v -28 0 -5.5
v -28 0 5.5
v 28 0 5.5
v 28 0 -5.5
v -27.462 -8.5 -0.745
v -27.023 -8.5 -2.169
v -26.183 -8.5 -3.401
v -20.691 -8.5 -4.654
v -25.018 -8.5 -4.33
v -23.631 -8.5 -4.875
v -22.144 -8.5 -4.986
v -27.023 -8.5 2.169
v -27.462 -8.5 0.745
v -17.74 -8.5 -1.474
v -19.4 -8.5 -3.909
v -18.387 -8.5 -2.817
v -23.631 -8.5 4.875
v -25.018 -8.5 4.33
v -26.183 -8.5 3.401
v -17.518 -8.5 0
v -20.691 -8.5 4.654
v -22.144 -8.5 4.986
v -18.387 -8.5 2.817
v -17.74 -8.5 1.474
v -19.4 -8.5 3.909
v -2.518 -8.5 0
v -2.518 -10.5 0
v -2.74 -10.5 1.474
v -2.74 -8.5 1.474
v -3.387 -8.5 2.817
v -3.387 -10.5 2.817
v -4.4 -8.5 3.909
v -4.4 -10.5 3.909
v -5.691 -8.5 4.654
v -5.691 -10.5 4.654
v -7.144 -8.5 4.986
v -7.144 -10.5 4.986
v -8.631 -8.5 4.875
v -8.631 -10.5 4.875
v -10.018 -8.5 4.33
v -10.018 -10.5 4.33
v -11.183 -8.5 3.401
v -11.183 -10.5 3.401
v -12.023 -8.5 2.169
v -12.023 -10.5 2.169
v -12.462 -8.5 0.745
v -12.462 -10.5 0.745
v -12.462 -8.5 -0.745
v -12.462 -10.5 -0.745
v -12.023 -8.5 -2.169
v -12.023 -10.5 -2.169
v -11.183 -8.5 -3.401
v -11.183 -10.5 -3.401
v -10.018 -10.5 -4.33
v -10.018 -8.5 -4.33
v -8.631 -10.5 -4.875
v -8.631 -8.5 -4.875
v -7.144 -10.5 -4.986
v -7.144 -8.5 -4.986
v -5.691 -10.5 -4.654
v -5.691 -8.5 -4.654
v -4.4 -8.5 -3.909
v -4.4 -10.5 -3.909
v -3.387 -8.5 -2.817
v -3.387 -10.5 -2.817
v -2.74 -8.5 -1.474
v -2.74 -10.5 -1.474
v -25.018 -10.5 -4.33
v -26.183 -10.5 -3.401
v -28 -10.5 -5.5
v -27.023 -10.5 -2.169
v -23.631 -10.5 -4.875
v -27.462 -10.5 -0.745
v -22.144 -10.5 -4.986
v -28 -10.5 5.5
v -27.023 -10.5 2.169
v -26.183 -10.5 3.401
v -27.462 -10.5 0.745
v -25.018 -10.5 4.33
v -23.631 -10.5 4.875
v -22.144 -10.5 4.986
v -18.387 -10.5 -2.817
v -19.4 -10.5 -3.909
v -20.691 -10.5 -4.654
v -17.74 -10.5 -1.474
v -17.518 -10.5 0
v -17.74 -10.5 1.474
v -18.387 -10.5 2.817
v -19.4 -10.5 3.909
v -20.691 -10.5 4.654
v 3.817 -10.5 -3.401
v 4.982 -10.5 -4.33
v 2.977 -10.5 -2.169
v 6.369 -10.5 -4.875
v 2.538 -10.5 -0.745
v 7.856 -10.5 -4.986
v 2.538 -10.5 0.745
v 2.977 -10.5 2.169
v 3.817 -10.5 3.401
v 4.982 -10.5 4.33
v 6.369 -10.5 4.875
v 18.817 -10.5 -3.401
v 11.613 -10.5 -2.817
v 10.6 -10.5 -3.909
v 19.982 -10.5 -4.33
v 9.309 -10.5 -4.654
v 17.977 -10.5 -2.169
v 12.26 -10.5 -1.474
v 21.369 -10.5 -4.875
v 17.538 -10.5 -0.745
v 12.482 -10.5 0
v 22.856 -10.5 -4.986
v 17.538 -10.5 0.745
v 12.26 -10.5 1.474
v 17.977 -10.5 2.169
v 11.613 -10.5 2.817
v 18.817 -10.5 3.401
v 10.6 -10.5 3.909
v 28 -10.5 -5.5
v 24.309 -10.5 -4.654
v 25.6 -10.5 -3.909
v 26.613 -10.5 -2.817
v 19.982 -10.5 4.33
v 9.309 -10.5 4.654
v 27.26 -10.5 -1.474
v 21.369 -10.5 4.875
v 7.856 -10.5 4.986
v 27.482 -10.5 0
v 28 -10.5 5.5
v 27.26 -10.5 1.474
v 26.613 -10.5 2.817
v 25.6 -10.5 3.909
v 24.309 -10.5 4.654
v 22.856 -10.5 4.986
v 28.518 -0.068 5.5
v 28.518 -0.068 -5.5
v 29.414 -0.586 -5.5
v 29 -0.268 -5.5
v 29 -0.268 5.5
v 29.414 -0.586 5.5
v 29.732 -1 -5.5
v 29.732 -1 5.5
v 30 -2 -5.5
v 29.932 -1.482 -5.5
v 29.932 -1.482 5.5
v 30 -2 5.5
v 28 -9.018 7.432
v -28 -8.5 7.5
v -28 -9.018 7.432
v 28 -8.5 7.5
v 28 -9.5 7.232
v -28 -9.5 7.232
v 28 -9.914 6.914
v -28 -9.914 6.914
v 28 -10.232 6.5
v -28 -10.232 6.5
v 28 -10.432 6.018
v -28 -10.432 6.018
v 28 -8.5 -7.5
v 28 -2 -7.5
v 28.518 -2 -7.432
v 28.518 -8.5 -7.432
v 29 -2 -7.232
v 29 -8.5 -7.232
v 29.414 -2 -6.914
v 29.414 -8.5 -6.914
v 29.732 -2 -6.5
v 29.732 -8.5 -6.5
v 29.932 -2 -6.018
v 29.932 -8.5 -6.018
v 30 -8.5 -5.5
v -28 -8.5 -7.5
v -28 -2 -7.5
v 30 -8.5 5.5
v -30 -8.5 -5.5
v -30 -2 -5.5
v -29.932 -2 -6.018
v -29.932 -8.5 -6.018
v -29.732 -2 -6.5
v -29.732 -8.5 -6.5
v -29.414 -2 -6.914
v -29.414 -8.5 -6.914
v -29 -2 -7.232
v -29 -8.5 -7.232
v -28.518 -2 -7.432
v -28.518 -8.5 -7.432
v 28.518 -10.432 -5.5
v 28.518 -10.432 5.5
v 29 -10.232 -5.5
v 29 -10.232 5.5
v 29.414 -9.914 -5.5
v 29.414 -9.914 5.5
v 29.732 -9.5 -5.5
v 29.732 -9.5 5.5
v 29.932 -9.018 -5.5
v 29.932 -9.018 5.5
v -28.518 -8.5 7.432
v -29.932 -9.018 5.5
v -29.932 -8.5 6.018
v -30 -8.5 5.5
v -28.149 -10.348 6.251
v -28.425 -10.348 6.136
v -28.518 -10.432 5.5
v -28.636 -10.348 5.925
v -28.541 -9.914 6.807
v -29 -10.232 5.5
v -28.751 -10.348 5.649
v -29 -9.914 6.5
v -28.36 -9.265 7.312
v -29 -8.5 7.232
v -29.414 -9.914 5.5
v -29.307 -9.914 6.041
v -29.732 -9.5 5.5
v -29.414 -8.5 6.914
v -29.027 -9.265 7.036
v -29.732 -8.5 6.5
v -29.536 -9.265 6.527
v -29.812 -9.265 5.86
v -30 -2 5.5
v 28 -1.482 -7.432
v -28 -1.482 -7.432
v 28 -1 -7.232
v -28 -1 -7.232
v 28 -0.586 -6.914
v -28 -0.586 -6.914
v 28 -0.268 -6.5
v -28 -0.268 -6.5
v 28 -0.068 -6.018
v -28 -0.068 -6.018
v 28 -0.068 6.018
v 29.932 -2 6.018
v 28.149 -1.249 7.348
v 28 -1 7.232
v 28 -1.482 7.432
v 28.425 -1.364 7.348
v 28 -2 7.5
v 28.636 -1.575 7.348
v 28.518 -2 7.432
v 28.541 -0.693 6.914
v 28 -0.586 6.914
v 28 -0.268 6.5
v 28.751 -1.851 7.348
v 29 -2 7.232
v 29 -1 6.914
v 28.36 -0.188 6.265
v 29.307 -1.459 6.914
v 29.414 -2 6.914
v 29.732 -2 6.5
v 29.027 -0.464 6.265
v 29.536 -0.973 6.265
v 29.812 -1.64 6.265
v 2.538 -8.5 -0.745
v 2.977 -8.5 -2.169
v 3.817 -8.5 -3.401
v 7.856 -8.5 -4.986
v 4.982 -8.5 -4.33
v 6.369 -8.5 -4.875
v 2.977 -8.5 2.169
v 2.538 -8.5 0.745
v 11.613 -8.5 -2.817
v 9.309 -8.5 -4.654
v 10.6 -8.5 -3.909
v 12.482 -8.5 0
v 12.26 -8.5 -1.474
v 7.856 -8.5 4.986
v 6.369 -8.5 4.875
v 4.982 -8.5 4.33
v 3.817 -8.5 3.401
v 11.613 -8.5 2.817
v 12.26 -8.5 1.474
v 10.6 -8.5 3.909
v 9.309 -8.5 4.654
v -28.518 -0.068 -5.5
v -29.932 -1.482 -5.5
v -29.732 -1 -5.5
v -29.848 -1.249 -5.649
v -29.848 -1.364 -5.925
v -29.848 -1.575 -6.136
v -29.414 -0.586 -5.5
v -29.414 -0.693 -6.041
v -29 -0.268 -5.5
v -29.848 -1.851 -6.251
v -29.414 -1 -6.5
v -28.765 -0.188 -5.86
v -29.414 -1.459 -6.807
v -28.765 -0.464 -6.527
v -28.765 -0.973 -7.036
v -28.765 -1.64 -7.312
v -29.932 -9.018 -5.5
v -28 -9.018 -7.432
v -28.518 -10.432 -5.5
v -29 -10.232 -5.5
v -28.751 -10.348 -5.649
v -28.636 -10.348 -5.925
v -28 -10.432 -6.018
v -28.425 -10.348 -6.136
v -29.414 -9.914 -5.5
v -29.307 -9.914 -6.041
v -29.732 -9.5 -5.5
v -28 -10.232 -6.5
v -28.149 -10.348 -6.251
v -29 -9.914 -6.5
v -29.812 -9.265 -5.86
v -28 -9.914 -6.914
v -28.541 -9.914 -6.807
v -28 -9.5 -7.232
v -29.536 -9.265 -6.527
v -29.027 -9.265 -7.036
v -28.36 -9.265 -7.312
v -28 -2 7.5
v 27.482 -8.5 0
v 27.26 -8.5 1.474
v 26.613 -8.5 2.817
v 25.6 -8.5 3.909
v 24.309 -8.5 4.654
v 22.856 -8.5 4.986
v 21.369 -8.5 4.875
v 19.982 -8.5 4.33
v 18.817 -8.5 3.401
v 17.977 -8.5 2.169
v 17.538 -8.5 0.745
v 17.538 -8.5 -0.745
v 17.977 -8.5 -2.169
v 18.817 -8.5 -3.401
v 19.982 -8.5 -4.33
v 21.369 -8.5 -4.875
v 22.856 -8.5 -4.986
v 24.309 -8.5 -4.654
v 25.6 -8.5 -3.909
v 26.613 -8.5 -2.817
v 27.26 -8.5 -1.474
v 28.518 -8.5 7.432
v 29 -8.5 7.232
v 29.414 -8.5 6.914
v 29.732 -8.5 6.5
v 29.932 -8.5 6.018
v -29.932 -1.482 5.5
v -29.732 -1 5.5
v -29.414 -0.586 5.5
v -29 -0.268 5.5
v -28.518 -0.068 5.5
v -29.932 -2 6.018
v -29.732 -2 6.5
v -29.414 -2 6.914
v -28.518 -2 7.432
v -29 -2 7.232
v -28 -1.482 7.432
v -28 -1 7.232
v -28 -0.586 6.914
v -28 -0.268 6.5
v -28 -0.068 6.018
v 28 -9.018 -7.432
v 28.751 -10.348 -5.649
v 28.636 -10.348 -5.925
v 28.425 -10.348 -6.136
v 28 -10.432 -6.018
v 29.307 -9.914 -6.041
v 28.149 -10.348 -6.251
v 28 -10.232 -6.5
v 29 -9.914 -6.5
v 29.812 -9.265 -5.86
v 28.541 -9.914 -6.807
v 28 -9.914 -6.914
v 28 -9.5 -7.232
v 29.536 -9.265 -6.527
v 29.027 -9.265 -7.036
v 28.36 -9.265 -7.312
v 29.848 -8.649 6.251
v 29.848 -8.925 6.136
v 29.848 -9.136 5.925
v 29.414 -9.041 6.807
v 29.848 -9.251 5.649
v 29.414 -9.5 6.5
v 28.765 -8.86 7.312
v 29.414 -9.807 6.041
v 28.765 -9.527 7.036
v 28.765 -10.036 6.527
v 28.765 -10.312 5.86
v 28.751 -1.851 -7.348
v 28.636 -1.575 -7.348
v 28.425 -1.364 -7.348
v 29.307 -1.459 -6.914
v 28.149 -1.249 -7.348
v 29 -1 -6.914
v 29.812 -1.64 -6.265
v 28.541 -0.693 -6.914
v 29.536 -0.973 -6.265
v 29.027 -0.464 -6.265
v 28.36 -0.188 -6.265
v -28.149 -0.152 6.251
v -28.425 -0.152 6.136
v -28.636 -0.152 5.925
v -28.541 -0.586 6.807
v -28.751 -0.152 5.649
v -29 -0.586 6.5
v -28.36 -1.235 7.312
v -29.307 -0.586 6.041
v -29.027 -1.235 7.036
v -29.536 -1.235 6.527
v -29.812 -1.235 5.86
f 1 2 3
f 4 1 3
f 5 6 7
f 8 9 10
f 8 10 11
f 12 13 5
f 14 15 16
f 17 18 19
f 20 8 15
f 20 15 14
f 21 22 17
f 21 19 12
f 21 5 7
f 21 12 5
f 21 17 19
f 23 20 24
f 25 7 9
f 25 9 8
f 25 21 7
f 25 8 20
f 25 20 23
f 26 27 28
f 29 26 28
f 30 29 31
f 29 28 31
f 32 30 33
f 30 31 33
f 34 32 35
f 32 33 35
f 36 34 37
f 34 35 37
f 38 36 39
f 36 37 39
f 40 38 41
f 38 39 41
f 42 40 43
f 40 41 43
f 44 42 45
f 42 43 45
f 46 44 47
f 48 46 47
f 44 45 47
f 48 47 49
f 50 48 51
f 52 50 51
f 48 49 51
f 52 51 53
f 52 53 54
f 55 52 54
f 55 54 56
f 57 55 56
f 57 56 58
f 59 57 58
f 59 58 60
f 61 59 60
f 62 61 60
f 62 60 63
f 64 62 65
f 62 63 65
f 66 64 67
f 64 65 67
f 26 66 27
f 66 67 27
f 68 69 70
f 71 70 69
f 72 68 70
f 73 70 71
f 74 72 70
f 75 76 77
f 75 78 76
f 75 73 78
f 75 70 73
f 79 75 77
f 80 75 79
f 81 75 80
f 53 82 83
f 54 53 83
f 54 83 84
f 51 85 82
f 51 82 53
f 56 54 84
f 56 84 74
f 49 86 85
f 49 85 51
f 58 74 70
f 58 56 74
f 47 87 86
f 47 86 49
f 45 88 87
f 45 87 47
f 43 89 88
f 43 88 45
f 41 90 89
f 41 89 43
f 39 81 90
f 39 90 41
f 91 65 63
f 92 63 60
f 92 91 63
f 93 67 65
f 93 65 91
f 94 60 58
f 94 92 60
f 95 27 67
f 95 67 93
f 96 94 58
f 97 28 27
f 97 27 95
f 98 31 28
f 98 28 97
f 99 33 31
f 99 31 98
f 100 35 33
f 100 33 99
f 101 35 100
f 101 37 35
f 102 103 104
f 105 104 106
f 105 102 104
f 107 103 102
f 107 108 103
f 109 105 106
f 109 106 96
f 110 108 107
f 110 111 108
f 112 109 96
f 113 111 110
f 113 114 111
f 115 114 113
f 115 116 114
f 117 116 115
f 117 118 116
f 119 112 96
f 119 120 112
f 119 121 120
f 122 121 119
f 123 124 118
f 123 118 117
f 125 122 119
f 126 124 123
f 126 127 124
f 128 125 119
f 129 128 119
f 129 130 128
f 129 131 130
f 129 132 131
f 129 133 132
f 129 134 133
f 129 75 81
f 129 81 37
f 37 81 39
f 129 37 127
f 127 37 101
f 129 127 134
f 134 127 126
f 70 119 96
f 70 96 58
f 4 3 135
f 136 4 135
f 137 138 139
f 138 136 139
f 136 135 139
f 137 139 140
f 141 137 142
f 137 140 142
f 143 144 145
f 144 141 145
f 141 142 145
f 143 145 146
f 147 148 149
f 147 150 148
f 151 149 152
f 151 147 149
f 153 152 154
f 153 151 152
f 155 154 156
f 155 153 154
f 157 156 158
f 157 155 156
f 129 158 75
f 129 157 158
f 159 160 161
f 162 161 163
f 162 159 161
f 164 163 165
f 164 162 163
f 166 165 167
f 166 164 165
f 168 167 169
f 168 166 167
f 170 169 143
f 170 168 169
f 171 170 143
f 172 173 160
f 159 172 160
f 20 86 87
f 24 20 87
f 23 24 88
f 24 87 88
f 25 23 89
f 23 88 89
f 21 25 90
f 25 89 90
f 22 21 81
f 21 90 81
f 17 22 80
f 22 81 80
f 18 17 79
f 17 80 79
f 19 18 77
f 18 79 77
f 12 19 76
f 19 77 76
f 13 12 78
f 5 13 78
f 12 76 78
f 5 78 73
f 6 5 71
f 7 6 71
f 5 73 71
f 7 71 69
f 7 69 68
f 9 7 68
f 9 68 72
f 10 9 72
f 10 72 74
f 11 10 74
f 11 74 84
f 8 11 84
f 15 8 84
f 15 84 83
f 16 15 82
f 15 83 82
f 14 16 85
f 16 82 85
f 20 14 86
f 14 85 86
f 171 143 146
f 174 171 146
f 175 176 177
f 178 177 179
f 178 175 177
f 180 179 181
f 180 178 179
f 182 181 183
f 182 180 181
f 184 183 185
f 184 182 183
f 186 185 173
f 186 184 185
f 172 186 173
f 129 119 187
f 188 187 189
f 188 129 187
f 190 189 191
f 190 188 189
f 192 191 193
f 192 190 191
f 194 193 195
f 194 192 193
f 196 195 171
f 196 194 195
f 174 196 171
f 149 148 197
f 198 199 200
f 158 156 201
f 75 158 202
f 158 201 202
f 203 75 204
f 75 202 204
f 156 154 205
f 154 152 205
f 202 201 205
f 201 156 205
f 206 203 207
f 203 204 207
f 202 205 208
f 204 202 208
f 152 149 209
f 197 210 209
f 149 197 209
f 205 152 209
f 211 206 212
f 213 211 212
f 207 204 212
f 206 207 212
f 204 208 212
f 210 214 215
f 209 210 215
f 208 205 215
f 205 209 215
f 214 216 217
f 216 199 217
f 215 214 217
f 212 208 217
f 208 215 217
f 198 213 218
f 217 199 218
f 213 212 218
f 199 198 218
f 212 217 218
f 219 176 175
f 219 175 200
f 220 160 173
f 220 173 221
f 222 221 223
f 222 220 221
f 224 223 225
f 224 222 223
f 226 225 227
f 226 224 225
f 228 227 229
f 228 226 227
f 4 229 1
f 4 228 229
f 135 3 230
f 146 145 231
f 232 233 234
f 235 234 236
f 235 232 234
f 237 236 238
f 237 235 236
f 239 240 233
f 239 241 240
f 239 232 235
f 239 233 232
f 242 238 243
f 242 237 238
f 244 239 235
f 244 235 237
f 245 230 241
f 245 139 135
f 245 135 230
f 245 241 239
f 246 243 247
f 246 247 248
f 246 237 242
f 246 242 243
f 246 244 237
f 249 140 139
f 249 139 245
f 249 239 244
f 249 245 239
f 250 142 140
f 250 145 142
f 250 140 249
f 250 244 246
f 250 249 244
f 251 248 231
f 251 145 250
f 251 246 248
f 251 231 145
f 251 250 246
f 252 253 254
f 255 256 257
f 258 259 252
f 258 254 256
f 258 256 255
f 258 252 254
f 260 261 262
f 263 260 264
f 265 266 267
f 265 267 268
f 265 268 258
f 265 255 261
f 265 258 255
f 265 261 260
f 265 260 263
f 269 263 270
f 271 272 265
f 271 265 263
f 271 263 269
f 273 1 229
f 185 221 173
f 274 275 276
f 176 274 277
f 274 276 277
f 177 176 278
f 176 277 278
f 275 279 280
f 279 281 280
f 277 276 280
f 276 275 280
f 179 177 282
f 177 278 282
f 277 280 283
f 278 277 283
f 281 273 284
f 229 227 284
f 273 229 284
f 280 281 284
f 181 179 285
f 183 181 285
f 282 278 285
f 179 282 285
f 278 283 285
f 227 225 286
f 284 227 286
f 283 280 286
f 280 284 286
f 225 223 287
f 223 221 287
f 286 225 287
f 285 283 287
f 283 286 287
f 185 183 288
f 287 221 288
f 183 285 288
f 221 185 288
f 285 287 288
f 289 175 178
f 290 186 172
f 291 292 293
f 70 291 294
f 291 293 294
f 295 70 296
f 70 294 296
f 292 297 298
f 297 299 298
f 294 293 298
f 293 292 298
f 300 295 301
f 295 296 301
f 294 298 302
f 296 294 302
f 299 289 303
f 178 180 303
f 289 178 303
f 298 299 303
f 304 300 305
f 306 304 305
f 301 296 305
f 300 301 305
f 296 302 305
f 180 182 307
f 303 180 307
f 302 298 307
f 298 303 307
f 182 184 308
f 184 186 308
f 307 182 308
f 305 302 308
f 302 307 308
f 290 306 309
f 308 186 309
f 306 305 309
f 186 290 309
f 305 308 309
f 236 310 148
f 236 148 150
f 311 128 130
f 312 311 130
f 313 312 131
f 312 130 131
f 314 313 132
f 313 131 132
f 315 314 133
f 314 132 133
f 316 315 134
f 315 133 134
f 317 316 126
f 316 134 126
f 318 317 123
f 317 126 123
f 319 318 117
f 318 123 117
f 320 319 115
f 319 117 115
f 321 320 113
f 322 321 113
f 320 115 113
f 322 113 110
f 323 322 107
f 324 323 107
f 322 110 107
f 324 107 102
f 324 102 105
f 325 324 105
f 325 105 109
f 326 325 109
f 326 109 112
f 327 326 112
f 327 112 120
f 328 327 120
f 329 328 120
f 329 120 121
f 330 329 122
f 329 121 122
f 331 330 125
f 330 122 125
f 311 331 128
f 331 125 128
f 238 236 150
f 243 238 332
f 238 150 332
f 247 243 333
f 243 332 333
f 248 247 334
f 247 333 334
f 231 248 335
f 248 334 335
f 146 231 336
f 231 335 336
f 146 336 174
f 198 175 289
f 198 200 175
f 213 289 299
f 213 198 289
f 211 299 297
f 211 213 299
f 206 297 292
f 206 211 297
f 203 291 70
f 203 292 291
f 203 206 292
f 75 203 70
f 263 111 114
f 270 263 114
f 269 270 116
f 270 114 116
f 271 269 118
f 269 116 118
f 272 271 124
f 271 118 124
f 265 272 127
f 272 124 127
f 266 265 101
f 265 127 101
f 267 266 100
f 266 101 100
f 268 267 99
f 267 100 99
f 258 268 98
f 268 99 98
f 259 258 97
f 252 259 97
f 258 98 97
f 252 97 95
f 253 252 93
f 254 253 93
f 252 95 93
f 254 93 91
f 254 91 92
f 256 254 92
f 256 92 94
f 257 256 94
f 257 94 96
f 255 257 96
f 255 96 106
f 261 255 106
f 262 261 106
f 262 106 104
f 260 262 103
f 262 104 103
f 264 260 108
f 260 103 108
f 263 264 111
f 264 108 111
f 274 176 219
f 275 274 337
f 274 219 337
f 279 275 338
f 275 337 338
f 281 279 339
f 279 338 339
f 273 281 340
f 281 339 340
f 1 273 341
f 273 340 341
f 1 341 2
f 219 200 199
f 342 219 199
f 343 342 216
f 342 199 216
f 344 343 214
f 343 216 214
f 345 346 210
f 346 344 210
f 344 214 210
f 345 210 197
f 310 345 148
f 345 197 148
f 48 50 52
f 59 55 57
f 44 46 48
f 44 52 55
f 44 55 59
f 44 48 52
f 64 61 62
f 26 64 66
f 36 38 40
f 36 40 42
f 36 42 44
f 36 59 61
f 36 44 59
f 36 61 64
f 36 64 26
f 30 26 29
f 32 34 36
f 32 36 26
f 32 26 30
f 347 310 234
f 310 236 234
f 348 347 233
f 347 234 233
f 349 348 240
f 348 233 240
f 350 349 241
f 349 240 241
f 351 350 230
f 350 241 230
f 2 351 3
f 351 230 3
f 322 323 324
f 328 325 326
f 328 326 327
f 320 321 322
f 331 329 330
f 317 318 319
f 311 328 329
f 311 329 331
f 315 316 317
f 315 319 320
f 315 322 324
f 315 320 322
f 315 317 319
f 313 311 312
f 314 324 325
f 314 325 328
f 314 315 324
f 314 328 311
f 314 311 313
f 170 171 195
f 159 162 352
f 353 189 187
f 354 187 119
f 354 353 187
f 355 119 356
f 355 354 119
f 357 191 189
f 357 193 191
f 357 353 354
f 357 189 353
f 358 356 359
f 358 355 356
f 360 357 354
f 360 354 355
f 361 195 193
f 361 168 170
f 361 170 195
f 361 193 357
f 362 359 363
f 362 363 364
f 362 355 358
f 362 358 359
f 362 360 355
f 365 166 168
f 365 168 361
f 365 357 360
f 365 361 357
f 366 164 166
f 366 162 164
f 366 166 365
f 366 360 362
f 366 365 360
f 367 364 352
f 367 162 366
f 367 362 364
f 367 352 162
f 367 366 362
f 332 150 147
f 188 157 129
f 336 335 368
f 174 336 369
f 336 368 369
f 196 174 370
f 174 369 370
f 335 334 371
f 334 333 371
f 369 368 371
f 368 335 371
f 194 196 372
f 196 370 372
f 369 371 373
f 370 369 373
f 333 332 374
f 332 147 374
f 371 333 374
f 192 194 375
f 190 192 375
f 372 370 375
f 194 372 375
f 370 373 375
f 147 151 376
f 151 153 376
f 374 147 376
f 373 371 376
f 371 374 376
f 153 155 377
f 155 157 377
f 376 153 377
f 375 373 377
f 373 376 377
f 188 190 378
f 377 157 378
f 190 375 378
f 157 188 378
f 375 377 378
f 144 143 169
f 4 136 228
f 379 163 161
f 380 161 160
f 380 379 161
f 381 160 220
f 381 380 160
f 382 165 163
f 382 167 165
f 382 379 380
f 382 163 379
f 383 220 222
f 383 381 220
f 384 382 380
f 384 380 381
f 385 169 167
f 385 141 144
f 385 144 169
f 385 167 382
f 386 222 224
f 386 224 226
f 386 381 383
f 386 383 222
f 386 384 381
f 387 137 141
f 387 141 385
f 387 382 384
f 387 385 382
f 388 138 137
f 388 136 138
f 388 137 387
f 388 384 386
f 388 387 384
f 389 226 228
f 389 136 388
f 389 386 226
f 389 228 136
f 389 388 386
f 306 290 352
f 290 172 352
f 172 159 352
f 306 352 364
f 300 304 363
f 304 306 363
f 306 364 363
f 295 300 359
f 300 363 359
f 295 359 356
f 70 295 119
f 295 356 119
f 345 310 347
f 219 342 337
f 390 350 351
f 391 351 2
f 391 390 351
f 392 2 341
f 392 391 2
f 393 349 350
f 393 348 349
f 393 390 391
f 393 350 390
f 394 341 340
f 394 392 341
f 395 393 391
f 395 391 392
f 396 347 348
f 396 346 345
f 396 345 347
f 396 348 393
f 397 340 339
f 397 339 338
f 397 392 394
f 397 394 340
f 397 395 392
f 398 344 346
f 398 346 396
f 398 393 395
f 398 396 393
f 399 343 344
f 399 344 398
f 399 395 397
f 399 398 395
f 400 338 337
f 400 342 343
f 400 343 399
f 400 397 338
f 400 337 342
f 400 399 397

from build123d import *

# Parameters (mm, degrees)
F0_W     = 60
F0_H     = 15
F1_DEPTH = 10.5
F2_R     = 5
F3_DEPTH = 2
F4_R     = 2


# Not quite as in the source:
# - a feature names something its author has since deleted; it is built from what else it names


with BuildPart() as f1:
    # F0 (on Front) → F1 (new body)
    with BuildSketch(Plane.XZ):
        Rectangle(F0_W, F0_H)
    extrude(amount=F1_DEPTH)

    # F2 (on face) → F3 (cut)
    with BuildSketch(Plane.XZ.offset(10.5)):
        with Locations((-22.5179158151, 0)):
            Circle(F2_R)
        with Locations((-7.5179158151, 0)):
            Circle(F2_R)
        with Locations((7.4820841849, 0)):
            Circle(F2_R)
        with Locations((22.4820841849, 0)):
            Circle(F2_R)
    extrude(amount=-F3_DEPTH, mode=Mode.SUBTRACT)

    # F4
    f4_edges = [f1.edges().sort_by_distance(p)[0] for p in [
        (-30, -5.25, 7.5),
        (30, 0, 0),
        (0, -10.5, 7.5),
        (0, 0, 7.5),
        (30, -5.25, 7.5),
        (30, -5.25, -7.5),
        (30, -10.5, 0),
        (0, 0, -7.5),
        (-30, 0, 0),
        (-30, -5.25, -7.5),
        (-30, -10.5, 0),
        (0, -10.5, -7.5),
    ]]
    fillet(f4_edges, radius=F4_R)


solid = f1.part
